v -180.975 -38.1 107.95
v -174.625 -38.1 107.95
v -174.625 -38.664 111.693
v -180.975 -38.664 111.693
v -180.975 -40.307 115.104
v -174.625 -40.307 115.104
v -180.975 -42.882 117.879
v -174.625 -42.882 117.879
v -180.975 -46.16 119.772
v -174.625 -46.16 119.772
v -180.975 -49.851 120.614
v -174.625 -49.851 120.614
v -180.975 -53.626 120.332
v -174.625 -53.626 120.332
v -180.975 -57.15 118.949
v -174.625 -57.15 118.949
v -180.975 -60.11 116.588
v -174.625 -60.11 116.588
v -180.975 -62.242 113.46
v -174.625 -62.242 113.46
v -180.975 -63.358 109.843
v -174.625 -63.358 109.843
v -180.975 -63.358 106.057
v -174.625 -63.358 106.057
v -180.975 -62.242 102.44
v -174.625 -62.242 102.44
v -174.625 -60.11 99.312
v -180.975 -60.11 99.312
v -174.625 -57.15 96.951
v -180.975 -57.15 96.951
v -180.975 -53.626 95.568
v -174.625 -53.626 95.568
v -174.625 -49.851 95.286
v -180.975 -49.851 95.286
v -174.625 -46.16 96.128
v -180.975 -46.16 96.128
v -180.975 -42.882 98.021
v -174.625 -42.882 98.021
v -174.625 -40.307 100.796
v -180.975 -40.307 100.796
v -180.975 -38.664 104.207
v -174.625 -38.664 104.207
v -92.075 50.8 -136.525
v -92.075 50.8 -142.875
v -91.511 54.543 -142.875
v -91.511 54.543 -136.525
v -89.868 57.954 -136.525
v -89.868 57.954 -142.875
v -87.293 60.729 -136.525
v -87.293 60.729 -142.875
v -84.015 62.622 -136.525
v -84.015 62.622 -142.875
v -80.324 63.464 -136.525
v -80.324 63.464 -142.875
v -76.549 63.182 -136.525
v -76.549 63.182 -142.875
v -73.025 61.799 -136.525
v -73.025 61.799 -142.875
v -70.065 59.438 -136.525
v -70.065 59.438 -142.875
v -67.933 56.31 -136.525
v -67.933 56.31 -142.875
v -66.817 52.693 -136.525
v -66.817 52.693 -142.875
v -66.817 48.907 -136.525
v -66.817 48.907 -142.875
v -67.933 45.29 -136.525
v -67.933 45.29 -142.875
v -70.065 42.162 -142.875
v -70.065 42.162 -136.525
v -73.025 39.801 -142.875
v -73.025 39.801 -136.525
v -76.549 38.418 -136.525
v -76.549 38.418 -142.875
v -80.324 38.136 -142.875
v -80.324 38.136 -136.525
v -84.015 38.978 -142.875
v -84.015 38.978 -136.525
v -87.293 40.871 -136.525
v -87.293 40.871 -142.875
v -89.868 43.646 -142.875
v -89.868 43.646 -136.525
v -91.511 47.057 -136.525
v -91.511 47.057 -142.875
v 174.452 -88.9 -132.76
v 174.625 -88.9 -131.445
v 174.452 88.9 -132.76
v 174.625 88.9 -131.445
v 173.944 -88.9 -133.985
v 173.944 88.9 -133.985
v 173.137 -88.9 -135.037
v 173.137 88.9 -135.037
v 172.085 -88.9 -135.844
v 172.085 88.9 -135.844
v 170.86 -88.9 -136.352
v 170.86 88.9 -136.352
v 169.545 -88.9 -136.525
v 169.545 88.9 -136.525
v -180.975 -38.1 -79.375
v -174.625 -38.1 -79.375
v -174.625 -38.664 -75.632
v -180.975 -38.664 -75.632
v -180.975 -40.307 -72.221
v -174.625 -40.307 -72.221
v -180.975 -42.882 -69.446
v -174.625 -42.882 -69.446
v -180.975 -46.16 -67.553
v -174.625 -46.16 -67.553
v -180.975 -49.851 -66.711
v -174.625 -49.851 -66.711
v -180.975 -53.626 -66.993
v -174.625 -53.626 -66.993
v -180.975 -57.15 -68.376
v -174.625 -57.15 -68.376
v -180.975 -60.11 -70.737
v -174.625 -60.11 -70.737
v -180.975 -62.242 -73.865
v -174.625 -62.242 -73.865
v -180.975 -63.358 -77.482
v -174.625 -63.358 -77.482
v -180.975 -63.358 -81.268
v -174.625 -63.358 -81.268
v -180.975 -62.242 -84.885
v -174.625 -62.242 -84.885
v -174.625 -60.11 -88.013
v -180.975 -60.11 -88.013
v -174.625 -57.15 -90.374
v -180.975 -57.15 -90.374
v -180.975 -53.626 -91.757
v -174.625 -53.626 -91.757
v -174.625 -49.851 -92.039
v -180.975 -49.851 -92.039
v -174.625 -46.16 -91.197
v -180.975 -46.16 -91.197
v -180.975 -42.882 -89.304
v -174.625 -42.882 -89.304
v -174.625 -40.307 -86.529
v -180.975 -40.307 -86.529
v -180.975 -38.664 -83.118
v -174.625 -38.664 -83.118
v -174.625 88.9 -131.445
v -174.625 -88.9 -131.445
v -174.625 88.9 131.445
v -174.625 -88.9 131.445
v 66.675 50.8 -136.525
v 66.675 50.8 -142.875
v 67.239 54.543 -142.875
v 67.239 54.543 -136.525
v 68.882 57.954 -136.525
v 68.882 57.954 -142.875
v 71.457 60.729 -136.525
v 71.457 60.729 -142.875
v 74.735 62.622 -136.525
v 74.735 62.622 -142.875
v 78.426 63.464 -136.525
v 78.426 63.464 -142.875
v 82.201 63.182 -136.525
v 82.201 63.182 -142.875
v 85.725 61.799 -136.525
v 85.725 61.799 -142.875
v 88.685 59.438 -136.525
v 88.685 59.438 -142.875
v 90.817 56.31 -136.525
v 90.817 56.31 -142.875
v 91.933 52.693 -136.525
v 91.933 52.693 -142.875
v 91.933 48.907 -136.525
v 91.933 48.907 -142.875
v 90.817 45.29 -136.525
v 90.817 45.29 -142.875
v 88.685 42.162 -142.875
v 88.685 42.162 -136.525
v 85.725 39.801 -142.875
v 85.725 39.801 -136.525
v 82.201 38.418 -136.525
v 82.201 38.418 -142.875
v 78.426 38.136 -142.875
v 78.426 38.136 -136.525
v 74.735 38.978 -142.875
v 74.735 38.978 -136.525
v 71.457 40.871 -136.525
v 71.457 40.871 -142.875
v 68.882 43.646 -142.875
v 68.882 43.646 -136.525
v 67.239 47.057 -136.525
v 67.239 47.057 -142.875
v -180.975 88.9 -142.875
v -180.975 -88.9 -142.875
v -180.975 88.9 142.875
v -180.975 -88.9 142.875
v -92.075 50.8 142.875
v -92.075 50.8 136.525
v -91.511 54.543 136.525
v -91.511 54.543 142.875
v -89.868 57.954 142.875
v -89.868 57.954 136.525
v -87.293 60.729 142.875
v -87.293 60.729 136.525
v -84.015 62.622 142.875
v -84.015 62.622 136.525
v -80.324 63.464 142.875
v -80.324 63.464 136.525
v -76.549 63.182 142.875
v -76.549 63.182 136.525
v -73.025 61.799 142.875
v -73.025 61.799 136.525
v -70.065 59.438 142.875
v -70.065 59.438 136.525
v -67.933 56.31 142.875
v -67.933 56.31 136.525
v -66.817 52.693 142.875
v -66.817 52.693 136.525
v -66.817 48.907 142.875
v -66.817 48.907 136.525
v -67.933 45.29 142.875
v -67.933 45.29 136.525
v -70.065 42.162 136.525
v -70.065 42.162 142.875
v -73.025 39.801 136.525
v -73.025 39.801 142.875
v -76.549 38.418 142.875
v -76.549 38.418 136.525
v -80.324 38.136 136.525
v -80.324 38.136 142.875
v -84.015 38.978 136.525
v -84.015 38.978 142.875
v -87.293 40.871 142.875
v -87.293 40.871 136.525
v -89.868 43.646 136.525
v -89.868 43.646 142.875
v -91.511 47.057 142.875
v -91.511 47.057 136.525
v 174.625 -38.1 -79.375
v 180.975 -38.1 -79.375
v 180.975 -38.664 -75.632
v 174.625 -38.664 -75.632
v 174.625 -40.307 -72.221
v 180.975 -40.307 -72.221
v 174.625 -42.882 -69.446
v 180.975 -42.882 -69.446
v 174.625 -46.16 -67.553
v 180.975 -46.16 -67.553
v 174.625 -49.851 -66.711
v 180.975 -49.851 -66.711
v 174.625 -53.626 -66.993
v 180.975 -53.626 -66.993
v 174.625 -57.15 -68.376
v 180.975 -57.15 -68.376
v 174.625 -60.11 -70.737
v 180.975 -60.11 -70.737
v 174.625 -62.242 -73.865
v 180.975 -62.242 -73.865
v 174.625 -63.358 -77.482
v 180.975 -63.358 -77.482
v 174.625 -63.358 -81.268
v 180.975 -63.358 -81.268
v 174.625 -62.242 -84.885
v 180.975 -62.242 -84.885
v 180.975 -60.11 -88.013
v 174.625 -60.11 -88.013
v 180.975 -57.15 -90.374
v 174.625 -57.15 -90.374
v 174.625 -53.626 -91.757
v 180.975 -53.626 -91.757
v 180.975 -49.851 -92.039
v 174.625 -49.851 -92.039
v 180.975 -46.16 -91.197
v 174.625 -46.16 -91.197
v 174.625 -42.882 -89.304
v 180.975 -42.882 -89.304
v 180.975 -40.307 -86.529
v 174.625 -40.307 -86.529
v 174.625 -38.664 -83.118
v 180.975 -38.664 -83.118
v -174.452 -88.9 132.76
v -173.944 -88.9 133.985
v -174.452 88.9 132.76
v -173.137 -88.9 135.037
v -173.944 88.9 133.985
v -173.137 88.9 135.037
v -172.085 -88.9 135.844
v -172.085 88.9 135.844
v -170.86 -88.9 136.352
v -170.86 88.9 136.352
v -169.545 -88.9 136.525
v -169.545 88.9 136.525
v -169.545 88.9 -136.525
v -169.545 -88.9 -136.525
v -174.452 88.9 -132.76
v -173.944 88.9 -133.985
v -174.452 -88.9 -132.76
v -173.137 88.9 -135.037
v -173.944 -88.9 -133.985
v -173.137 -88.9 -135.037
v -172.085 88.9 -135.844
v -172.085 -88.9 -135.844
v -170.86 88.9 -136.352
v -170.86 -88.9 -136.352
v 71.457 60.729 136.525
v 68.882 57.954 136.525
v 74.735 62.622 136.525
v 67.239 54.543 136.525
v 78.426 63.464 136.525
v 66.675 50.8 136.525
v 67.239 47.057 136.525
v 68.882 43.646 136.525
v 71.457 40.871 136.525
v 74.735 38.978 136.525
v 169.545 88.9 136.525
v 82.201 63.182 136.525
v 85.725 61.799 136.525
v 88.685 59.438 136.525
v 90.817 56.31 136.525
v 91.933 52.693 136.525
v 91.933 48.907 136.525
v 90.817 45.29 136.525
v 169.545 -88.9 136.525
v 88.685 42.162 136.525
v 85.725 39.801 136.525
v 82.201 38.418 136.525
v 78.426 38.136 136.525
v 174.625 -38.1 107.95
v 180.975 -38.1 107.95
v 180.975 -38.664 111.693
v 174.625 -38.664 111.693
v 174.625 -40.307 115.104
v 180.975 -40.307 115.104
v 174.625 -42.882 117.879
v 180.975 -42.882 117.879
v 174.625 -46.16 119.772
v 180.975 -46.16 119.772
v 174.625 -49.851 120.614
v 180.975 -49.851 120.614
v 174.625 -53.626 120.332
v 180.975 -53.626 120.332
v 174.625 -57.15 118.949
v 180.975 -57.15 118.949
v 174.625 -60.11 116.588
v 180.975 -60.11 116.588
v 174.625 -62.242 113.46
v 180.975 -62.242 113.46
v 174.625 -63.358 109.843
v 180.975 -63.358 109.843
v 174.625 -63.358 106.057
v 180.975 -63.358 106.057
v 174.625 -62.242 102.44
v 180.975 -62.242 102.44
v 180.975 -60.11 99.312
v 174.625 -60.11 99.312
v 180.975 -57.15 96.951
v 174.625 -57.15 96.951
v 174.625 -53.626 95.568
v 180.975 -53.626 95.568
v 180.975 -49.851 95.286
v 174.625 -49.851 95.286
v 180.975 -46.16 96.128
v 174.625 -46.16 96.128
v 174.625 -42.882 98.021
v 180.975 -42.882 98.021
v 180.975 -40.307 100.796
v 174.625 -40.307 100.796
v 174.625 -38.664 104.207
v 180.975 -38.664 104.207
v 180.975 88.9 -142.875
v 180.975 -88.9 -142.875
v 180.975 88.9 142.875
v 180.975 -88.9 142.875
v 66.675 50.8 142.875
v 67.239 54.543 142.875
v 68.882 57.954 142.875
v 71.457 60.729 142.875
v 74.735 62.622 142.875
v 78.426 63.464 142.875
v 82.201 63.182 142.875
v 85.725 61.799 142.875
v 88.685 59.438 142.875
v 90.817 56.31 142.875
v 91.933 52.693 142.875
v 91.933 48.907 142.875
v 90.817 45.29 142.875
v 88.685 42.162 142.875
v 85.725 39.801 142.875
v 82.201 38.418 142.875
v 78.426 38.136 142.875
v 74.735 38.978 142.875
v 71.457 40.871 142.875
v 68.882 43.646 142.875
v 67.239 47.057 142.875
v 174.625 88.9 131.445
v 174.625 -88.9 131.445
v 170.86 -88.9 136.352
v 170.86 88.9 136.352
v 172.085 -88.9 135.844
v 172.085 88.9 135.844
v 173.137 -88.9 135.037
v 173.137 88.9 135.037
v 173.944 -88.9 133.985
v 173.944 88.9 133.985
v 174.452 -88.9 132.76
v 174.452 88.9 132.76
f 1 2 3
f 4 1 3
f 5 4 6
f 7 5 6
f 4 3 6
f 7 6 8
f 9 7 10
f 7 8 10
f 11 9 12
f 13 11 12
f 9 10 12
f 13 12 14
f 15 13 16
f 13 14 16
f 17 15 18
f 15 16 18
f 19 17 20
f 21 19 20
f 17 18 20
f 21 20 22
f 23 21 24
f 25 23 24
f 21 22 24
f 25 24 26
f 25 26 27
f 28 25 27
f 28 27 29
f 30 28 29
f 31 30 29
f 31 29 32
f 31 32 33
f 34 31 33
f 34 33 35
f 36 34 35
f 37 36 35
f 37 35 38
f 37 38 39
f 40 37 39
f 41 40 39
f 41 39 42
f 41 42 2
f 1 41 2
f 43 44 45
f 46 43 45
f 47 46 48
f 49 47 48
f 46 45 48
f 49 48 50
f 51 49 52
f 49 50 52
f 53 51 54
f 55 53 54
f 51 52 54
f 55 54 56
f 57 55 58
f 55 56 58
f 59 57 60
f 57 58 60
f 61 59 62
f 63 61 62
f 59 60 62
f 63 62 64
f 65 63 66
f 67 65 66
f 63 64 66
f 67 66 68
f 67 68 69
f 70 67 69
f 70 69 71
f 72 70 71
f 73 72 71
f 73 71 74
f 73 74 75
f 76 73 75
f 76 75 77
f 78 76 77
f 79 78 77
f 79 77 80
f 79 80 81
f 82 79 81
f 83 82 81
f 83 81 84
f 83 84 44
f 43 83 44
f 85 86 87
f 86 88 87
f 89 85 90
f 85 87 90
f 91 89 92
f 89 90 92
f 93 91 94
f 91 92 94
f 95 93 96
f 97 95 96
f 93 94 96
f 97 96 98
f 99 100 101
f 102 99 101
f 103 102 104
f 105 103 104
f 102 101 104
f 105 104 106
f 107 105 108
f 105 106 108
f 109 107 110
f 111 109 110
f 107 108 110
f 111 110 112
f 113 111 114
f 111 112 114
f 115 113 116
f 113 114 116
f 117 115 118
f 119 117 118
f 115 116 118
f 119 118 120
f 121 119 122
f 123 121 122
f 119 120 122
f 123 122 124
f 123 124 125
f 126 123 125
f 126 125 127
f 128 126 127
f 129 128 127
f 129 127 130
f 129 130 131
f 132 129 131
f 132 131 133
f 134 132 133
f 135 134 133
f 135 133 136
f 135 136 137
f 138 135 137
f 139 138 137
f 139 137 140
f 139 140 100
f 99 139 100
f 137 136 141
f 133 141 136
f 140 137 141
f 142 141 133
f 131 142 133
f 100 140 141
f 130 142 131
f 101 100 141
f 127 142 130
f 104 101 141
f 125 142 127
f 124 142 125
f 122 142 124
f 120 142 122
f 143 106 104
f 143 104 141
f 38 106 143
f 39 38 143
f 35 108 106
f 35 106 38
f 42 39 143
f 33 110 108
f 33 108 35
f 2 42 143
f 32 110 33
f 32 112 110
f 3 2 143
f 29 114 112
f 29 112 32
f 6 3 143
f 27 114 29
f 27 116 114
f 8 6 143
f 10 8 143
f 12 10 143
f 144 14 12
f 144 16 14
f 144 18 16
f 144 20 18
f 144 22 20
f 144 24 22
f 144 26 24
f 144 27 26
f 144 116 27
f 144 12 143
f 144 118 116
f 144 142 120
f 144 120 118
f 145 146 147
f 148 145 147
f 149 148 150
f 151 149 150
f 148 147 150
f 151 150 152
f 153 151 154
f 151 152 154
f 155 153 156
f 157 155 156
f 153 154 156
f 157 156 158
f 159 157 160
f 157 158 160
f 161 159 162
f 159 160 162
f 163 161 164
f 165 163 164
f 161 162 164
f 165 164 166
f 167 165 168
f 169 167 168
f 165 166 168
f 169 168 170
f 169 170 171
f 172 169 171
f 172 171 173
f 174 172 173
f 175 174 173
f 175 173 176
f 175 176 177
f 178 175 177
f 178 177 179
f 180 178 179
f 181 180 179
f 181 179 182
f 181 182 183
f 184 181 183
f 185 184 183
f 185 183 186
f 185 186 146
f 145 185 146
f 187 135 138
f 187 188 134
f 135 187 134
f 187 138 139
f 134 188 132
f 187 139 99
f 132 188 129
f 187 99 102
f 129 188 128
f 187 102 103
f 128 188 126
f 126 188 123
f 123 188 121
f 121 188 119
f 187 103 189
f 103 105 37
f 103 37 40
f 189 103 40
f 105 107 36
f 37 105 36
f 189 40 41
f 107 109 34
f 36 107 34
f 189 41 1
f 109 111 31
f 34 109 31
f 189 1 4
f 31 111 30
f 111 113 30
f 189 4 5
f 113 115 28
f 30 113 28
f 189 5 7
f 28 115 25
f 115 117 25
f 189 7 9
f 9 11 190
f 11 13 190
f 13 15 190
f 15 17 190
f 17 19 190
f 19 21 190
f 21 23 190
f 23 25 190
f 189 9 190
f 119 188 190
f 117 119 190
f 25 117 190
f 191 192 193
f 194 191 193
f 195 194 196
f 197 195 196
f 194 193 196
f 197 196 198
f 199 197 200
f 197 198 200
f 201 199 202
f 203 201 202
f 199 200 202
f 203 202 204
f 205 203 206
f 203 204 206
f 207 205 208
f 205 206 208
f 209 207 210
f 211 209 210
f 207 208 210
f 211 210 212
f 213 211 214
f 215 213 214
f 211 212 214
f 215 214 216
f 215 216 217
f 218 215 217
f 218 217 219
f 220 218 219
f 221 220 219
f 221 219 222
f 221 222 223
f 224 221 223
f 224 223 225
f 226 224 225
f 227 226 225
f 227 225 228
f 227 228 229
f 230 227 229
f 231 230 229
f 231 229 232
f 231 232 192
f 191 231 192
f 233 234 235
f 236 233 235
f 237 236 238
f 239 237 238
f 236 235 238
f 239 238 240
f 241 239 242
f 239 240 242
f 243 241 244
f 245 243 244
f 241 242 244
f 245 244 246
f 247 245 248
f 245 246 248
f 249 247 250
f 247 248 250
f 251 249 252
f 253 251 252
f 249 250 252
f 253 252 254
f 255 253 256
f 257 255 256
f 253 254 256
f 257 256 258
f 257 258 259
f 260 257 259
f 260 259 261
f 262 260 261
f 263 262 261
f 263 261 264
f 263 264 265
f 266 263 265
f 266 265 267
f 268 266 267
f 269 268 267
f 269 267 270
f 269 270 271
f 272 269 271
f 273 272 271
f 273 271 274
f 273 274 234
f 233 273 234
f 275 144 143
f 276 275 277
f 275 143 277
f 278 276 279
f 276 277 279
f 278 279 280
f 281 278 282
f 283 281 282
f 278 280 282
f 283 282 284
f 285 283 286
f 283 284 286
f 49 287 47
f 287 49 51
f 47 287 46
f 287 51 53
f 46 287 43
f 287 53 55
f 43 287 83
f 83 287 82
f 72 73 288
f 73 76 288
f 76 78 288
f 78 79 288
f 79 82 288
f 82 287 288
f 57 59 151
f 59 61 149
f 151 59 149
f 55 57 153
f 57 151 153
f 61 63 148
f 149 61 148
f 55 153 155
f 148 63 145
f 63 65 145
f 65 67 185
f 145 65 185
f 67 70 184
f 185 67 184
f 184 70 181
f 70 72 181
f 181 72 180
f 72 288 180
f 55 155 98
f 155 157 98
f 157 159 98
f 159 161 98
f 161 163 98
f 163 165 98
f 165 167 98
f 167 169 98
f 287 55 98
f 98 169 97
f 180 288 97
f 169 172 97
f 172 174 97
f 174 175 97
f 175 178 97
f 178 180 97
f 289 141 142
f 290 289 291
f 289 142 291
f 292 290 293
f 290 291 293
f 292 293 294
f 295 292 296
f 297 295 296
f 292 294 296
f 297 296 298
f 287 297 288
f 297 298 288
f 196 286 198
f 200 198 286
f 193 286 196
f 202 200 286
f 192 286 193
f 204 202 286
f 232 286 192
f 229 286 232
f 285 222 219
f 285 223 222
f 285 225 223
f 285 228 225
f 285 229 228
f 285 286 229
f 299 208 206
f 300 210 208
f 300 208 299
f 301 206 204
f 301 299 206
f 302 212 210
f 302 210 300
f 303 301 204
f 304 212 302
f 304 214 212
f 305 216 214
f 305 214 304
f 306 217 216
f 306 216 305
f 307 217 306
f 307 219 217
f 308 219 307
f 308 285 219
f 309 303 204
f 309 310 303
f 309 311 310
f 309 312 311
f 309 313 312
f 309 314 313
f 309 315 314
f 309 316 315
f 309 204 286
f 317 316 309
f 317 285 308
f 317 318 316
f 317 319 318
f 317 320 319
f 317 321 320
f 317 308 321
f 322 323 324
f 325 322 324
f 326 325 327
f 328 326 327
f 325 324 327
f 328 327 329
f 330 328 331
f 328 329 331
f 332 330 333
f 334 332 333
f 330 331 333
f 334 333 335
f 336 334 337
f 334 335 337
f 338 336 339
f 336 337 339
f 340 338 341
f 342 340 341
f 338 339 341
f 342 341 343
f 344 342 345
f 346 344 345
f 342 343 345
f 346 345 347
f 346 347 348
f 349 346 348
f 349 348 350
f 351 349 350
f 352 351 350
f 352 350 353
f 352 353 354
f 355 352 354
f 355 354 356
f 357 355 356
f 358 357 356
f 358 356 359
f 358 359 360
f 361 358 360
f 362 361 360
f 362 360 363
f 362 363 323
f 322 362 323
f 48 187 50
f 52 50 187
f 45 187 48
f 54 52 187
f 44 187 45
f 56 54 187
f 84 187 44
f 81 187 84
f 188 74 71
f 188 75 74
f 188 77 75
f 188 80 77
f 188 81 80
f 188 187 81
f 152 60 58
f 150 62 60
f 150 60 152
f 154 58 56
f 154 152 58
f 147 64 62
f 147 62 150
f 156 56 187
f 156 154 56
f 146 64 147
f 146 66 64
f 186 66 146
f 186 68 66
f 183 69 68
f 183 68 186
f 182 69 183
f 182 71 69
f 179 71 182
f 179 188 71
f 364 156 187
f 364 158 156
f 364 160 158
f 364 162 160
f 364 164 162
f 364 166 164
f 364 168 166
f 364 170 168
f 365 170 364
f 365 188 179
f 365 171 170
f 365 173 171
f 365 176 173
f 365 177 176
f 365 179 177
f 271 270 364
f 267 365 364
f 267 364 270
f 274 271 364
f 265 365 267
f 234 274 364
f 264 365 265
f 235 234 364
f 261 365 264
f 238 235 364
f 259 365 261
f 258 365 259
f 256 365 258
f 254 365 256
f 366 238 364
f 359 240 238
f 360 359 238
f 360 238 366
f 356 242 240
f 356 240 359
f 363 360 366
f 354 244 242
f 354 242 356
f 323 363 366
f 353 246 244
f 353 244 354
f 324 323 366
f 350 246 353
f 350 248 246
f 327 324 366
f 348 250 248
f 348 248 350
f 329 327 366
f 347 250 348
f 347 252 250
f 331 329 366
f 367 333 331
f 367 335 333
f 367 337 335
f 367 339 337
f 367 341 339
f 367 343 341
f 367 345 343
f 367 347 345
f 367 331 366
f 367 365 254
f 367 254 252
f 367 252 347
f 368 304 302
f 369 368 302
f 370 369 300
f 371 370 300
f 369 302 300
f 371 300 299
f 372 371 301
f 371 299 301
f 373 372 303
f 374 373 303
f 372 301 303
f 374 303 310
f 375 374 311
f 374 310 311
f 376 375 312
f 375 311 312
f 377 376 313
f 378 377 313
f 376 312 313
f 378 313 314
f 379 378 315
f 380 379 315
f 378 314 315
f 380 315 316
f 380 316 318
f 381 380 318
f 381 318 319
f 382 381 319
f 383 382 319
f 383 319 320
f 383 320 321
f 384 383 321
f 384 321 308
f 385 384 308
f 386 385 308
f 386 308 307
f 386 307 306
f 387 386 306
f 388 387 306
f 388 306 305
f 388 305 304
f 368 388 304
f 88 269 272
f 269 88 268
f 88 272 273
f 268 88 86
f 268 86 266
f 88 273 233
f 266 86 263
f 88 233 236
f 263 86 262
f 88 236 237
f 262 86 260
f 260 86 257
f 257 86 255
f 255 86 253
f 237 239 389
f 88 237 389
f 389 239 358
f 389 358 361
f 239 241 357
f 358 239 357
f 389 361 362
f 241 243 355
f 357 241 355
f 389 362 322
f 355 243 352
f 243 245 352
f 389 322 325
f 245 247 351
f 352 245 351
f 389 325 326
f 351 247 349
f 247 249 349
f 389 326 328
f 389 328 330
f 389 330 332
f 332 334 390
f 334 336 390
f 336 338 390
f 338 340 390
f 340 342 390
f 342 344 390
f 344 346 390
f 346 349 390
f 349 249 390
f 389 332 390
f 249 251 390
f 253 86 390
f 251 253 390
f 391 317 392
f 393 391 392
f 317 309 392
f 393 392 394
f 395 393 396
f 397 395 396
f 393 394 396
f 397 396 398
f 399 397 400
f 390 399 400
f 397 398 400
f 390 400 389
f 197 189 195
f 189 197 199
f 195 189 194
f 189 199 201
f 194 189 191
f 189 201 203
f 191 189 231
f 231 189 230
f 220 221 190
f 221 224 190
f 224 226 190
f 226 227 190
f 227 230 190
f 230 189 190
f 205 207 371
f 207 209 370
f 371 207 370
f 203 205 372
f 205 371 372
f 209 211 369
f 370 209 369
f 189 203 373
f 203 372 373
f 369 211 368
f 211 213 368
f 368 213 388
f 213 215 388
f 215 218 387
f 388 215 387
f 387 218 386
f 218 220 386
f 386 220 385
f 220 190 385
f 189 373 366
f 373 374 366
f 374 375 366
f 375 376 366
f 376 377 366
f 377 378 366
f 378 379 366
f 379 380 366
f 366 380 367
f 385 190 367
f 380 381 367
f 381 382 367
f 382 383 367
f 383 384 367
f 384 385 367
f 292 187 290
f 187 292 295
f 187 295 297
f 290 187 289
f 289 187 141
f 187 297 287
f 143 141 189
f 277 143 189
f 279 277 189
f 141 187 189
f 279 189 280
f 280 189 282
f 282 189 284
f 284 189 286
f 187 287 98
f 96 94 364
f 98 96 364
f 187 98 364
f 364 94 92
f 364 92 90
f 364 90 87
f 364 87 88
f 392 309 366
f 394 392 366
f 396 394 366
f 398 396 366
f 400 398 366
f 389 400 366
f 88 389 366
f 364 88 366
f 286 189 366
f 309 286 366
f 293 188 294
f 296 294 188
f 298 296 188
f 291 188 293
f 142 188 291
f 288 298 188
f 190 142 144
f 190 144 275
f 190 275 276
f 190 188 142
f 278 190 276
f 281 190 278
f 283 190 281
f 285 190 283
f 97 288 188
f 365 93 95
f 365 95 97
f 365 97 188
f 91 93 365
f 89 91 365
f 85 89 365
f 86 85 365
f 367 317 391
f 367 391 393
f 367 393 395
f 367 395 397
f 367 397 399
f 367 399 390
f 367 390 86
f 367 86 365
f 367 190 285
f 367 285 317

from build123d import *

# Parameters (mm, degrees)
F0_W     = 361.95
F0_H     = 285.75
F0_W_2   = 349.25
F0_H_2   = 273.05
F1_DEPTH = 88.9
F2_R     = 5.08
F4_D     = 25.4
F6_D     = 25.4


with BuildPart() as f1:
    # F0 (on Front) → F1 (new body, symmetric)
    with BuildSketch(Plane.XZ):
        Rectangle(F0_W, F0_H)
        Rectangle(F0_W_2, F0_H_2, mode=Mode.SUBTRACT)
    extrude(amount=F1_DEPTH, both=True)

    # F2
    f2_edges = [f1.edges().sort_by_distance(p)[0] for p in [
        (-174.625, 0, -136.525),
        (174.625, 0, -136.525),
        (174.625, 0, 136.525),
        (-174.625, 0, 136.525),
    ]]
    fillet(f2_edges, radius=F2_R)

    # F4 (through all)
    with Locations(Plane.XY.offset(142.875)):
        with Locations((-79.375005, 50.8), (79.375, 50.8)):
            Hole(F4_D / 2)

    # F6 (through all)
    with Locations(Plane(origin=(-180.975, 0, 0), x_dir=(0, -1, 0), z_dir=(-1, 0, 0))):
        with Locations((50.799999, 107.95), (50.8, -79.375006)):
            Hole(F6_D / 2)


solid = f1.part
